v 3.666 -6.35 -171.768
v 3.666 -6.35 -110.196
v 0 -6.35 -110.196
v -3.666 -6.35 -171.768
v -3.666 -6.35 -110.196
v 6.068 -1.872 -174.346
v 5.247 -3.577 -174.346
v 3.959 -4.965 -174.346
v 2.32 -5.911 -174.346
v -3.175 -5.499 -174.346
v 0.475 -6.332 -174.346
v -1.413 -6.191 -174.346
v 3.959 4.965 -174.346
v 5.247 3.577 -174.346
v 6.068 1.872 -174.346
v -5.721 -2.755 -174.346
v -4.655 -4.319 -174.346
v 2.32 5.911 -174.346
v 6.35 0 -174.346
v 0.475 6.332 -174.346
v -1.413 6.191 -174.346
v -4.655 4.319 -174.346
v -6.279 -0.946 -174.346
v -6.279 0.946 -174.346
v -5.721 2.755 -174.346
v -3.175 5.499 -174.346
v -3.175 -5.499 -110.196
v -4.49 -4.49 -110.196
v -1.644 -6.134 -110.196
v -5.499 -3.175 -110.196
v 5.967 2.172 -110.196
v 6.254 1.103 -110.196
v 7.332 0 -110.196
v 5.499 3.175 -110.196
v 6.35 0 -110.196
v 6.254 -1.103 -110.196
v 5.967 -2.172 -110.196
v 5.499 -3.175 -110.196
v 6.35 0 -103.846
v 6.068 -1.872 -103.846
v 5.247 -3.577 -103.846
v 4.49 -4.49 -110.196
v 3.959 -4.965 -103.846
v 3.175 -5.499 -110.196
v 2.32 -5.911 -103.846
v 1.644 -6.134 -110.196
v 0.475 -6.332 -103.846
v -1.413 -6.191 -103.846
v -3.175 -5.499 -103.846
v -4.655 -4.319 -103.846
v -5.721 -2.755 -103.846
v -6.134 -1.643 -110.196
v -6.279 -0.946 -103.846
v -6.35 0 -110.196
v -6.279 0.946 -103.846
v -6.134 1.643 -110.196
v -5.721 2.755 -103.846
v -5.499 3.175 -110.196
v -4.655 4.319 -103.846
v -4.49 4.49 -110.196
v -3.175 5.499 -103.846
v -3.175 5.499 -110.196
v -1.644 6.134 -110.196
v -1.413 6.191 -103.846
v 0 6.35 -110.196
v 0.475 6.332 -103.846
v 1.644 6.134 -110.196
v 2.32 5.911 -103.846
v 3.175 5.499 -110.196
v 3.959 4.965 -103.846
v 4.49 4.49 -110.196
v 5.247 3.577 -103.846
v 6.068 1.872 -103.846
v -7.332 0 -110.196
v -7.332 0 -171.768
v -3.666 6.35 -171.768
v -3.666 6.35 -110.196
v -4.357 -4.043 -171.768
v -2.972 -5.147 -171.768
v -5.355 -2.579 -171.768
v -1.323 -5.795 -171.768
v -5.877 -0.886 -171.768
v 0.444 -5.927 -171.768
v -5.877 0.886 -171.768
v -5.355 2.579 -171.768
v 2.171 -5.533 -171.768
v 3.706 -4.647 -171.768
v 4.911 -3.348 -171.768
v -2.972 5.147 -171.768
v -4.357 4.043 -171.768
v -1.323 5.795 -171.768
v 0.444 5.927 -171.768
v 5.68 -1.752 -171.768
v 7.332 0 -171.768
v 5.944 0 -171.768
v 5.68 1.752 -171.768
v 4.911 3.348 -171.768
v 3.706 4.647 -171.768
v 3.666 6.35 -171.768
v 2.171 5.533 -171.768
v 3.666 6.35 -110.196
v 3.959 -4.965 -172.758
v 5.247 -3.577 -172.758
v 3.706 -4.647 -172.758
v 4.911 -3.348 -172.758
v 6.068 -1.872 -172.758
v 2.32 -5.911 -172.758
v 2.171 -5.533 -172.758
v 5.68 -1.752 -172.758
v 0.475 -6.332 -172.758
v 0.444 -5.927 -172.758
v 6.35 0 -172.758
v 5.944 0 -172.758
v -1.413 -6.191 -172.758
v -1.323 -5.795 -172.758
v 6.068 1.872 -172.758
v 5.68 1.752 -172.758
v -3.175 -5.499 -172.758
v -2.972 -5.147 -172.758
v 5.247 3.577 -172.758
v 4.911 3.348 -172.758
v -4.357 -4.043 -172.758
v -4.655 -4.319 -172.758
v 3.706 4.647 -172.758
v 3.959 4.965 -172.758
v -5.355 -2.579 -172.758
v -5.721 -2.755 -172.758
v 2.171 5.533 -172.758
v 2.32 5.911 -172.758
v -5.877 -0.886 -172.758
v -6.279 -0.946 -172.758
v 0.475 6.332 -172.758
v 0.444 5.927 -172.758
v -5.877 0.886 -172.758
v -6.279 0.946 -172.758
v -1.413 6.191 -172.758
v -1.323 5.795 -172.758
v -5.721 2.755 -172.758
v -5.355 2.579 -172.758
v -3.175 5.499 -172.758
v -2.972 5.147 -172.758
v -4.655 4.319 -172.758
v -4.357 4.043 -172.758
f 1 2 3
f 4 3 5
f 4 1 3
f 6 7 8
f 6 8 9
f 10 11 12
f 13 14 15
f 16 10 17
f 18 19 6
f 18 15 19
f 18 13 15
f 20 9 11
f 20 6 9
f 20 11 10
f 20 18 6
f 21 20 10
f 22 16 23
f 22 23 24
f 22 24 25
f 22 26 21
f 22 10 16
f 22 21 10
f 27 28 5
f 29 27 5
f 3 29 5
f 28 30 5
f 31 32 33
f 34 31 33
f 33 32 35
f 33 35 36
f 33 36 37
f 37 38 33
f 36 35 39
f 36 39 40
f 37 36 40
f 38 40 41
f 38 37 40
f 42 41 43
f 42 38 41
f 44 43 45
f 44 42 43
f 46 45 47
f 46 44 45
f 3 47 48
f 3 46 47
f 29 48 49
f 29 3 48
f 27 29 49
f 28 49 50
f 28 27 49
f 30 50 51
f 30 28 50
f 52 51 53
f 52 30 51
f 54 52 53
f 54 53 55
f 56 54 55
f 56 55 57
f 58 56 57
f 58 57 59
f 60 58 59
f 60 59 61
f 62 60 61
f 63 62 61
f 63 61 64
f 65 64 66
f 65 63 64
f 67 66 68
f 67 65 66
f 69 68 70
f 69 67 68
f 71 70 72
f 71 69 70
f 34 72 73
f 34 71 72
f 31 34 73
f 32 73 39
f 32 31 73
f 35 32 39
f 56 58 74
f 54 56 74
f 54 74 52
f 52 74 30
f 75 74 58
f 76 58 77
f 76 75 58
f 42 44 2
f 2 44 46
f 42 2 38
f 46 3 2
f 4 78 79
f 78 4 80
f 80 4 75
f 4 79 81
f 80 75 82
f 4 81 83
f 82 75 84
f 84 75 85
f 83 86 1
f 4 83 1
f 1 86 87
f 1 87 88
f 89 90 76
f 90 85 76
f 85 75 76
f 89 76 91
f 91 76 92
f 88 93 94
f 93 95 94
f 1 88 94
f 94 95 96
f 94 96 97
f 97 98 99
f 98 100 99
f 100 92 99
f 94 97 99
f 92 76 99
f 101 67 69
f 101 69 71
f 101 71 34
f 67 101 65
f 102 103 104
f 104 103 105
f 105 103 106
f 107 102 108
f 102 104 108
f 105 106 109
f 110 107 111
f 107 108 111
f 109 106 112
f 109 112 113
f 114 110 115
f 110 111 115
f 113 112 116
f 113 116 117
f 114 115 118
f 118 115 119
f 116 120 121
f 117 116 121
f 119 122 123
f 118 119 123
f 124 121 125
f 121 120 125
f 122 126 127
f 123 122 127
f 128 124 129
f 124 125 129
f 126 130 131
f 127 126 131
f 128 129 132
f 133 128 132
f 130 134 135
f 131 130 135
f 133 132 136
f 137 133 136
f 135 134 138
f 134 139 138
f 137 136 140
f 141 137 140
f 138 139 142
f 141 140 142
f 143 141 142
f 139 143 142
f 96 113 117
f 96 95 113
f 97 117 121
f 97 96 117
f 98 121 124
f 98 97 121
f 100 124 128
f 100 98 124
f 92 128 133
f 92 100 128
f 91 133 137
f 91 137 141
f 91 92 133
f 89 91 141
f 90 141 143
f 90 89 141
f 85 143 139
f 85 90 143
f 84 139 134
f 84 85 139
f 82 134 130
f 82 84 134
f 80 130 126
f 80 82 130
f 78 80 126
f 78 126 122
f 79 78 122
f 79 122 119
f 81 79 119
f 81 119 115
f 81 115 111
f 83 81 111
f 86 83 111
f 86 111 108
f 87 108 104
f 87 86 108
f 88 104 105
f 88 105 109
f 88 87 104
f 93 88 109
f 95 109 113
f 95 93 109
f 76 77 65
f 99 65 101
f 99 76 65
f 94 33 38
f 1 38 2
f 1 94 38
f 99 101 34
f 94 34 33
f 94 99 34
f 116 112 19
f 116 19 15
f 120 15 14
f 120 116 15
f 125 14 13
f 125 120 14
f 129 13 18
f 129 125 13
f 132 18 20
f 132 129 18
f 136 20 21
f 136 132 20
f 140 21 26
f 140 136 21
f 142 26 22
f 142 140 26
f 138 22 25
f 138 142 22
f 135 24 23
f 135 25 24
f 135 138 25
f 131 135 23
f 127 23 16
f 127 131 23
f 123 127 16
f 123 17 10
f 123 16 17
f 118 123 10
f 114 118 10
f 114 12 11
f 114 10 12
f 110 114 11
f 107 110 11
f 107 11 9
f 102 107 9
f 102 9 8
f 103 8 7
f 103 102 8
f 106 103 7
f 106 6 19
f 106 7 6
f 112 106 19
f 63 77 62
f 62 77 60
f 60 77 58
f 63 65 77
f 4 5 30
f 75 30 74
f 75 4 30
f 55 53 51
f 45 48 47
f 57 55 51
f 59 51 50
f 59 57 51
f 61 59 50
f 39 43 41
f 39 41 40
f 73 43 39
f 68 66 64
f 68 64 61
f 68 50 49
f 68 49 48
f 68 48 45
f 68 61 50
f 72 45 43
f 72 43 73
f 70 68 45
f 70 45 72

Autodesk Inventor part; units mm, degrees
ref_plane "YZ Plane" through (0, 0, 0) normal (1, 0, 0) x (0, 1, 0)
ref_plane "XZ Plane" through (0, 0, 0) normal (0, 1, 0) x (-1, 0, 0)
ref_plane "XY Plane" through (0, 0, 0) normal (0, 0, 1) x (1, 0, 0)
sketch "Sketch1" plane through (0, 0, 0) normal (0, 0, 1) x (1, 0, 0)
  line L0 (7.3323, 0) -> (3.6662, -6.35)
  line L1 (3.6662, -6.35) -> (-3.6662, -6.35)
  line L2 (-3.6662, -6.35) -> (-7.3323, 0)
  line L3 (-7.3323, 0) -> (-3.6662, 6.35)
  line L4 (-3.6662, 6.35) -> (3.6662, 6.35)
  line L5 (3.6662, 6.35) -> (7.3323, 0)
  point P0 (0, 0)
  point P1 (0, 0)
  dimension "d0" = 12.7
extrude "Extrusion1" add sketch "Sketch1" along normal mid plane 343.535
sketch "Sketch2" plane through (0, 0, 171.7675) normal (0, 0, 1) x (1, 0, 0)
  circle A0 centre (0, 0) radius 5.9436
  dimension "d3" = 11.8872
extrude "Extrusion2" add sketch "Sketch2" along normal blind 0.9906
sketch "Sketch3" plane through (0, 0, 172.7581) normal (0, 0, 1) x (1, 0, 0)
  circle A0 centre (0, 0) radius 5.9436 projected
  line L0 (3.6662, -6.35) -> (7.3323, 0) projected
  line L1 (7.3323, 0) -> (3.6662, 6.35) projected
  line L2 (3.6662, 6.35) -> (-3.6662, 6.35) projected
  line L3 (-3.6662, 6.35) -> (-7.3323, 0) projected
  line L4 (-7.3323, 0) -> (-3.6662, -6.35) projected
  line L5 (-3.6662, -6.35) -> (3.6662, -6.35) projected
  circle A1 centre (0, 0) radius 6.35
extrude "Extrusion3" add sketch "Sketch3" along normal blind 1.5875 contours A0 | A1
mirror "Mirror1" about plane through (0, 0, 0) normal (0, 0, 1) of "Extrusion2", "Extrusion3"
sketch "Sketch4" plane through (-3.6662, -6.35, -171.7675) normal (-0.866, -0.5, 0) x (0, 0, 1)
  line L0 (61.571, -23.211) -> (381.4095, -23.211)
  line L1 (381.4095, -23.211) -> (381.4095, 34.5749)
  line L2 (381.4095, 34.5749) -> (61.571, 34.5749)
  line L3 (61.571, 34.5749) -> (61.571, -23.211)
  point P0 (171.7675, 3.6662)
extrude "Extrusion4" cut sketch "Sketch4" against normal blind 25.4
sketch "Sketch5" plane through (-3.6662, -6.35, -110.1965) normal (0, 0, 1) x (1, 0, 0)
  circle A0 centre (3.6662, 6.35) radius 6.35
  dimension "d10" = 12.7
extrude "Extrusion5" add sketch "Sketch5" along normal blind 6.35
properties part number "ARM_010_2.75inHexShaft" material "Aluminum 6061"
